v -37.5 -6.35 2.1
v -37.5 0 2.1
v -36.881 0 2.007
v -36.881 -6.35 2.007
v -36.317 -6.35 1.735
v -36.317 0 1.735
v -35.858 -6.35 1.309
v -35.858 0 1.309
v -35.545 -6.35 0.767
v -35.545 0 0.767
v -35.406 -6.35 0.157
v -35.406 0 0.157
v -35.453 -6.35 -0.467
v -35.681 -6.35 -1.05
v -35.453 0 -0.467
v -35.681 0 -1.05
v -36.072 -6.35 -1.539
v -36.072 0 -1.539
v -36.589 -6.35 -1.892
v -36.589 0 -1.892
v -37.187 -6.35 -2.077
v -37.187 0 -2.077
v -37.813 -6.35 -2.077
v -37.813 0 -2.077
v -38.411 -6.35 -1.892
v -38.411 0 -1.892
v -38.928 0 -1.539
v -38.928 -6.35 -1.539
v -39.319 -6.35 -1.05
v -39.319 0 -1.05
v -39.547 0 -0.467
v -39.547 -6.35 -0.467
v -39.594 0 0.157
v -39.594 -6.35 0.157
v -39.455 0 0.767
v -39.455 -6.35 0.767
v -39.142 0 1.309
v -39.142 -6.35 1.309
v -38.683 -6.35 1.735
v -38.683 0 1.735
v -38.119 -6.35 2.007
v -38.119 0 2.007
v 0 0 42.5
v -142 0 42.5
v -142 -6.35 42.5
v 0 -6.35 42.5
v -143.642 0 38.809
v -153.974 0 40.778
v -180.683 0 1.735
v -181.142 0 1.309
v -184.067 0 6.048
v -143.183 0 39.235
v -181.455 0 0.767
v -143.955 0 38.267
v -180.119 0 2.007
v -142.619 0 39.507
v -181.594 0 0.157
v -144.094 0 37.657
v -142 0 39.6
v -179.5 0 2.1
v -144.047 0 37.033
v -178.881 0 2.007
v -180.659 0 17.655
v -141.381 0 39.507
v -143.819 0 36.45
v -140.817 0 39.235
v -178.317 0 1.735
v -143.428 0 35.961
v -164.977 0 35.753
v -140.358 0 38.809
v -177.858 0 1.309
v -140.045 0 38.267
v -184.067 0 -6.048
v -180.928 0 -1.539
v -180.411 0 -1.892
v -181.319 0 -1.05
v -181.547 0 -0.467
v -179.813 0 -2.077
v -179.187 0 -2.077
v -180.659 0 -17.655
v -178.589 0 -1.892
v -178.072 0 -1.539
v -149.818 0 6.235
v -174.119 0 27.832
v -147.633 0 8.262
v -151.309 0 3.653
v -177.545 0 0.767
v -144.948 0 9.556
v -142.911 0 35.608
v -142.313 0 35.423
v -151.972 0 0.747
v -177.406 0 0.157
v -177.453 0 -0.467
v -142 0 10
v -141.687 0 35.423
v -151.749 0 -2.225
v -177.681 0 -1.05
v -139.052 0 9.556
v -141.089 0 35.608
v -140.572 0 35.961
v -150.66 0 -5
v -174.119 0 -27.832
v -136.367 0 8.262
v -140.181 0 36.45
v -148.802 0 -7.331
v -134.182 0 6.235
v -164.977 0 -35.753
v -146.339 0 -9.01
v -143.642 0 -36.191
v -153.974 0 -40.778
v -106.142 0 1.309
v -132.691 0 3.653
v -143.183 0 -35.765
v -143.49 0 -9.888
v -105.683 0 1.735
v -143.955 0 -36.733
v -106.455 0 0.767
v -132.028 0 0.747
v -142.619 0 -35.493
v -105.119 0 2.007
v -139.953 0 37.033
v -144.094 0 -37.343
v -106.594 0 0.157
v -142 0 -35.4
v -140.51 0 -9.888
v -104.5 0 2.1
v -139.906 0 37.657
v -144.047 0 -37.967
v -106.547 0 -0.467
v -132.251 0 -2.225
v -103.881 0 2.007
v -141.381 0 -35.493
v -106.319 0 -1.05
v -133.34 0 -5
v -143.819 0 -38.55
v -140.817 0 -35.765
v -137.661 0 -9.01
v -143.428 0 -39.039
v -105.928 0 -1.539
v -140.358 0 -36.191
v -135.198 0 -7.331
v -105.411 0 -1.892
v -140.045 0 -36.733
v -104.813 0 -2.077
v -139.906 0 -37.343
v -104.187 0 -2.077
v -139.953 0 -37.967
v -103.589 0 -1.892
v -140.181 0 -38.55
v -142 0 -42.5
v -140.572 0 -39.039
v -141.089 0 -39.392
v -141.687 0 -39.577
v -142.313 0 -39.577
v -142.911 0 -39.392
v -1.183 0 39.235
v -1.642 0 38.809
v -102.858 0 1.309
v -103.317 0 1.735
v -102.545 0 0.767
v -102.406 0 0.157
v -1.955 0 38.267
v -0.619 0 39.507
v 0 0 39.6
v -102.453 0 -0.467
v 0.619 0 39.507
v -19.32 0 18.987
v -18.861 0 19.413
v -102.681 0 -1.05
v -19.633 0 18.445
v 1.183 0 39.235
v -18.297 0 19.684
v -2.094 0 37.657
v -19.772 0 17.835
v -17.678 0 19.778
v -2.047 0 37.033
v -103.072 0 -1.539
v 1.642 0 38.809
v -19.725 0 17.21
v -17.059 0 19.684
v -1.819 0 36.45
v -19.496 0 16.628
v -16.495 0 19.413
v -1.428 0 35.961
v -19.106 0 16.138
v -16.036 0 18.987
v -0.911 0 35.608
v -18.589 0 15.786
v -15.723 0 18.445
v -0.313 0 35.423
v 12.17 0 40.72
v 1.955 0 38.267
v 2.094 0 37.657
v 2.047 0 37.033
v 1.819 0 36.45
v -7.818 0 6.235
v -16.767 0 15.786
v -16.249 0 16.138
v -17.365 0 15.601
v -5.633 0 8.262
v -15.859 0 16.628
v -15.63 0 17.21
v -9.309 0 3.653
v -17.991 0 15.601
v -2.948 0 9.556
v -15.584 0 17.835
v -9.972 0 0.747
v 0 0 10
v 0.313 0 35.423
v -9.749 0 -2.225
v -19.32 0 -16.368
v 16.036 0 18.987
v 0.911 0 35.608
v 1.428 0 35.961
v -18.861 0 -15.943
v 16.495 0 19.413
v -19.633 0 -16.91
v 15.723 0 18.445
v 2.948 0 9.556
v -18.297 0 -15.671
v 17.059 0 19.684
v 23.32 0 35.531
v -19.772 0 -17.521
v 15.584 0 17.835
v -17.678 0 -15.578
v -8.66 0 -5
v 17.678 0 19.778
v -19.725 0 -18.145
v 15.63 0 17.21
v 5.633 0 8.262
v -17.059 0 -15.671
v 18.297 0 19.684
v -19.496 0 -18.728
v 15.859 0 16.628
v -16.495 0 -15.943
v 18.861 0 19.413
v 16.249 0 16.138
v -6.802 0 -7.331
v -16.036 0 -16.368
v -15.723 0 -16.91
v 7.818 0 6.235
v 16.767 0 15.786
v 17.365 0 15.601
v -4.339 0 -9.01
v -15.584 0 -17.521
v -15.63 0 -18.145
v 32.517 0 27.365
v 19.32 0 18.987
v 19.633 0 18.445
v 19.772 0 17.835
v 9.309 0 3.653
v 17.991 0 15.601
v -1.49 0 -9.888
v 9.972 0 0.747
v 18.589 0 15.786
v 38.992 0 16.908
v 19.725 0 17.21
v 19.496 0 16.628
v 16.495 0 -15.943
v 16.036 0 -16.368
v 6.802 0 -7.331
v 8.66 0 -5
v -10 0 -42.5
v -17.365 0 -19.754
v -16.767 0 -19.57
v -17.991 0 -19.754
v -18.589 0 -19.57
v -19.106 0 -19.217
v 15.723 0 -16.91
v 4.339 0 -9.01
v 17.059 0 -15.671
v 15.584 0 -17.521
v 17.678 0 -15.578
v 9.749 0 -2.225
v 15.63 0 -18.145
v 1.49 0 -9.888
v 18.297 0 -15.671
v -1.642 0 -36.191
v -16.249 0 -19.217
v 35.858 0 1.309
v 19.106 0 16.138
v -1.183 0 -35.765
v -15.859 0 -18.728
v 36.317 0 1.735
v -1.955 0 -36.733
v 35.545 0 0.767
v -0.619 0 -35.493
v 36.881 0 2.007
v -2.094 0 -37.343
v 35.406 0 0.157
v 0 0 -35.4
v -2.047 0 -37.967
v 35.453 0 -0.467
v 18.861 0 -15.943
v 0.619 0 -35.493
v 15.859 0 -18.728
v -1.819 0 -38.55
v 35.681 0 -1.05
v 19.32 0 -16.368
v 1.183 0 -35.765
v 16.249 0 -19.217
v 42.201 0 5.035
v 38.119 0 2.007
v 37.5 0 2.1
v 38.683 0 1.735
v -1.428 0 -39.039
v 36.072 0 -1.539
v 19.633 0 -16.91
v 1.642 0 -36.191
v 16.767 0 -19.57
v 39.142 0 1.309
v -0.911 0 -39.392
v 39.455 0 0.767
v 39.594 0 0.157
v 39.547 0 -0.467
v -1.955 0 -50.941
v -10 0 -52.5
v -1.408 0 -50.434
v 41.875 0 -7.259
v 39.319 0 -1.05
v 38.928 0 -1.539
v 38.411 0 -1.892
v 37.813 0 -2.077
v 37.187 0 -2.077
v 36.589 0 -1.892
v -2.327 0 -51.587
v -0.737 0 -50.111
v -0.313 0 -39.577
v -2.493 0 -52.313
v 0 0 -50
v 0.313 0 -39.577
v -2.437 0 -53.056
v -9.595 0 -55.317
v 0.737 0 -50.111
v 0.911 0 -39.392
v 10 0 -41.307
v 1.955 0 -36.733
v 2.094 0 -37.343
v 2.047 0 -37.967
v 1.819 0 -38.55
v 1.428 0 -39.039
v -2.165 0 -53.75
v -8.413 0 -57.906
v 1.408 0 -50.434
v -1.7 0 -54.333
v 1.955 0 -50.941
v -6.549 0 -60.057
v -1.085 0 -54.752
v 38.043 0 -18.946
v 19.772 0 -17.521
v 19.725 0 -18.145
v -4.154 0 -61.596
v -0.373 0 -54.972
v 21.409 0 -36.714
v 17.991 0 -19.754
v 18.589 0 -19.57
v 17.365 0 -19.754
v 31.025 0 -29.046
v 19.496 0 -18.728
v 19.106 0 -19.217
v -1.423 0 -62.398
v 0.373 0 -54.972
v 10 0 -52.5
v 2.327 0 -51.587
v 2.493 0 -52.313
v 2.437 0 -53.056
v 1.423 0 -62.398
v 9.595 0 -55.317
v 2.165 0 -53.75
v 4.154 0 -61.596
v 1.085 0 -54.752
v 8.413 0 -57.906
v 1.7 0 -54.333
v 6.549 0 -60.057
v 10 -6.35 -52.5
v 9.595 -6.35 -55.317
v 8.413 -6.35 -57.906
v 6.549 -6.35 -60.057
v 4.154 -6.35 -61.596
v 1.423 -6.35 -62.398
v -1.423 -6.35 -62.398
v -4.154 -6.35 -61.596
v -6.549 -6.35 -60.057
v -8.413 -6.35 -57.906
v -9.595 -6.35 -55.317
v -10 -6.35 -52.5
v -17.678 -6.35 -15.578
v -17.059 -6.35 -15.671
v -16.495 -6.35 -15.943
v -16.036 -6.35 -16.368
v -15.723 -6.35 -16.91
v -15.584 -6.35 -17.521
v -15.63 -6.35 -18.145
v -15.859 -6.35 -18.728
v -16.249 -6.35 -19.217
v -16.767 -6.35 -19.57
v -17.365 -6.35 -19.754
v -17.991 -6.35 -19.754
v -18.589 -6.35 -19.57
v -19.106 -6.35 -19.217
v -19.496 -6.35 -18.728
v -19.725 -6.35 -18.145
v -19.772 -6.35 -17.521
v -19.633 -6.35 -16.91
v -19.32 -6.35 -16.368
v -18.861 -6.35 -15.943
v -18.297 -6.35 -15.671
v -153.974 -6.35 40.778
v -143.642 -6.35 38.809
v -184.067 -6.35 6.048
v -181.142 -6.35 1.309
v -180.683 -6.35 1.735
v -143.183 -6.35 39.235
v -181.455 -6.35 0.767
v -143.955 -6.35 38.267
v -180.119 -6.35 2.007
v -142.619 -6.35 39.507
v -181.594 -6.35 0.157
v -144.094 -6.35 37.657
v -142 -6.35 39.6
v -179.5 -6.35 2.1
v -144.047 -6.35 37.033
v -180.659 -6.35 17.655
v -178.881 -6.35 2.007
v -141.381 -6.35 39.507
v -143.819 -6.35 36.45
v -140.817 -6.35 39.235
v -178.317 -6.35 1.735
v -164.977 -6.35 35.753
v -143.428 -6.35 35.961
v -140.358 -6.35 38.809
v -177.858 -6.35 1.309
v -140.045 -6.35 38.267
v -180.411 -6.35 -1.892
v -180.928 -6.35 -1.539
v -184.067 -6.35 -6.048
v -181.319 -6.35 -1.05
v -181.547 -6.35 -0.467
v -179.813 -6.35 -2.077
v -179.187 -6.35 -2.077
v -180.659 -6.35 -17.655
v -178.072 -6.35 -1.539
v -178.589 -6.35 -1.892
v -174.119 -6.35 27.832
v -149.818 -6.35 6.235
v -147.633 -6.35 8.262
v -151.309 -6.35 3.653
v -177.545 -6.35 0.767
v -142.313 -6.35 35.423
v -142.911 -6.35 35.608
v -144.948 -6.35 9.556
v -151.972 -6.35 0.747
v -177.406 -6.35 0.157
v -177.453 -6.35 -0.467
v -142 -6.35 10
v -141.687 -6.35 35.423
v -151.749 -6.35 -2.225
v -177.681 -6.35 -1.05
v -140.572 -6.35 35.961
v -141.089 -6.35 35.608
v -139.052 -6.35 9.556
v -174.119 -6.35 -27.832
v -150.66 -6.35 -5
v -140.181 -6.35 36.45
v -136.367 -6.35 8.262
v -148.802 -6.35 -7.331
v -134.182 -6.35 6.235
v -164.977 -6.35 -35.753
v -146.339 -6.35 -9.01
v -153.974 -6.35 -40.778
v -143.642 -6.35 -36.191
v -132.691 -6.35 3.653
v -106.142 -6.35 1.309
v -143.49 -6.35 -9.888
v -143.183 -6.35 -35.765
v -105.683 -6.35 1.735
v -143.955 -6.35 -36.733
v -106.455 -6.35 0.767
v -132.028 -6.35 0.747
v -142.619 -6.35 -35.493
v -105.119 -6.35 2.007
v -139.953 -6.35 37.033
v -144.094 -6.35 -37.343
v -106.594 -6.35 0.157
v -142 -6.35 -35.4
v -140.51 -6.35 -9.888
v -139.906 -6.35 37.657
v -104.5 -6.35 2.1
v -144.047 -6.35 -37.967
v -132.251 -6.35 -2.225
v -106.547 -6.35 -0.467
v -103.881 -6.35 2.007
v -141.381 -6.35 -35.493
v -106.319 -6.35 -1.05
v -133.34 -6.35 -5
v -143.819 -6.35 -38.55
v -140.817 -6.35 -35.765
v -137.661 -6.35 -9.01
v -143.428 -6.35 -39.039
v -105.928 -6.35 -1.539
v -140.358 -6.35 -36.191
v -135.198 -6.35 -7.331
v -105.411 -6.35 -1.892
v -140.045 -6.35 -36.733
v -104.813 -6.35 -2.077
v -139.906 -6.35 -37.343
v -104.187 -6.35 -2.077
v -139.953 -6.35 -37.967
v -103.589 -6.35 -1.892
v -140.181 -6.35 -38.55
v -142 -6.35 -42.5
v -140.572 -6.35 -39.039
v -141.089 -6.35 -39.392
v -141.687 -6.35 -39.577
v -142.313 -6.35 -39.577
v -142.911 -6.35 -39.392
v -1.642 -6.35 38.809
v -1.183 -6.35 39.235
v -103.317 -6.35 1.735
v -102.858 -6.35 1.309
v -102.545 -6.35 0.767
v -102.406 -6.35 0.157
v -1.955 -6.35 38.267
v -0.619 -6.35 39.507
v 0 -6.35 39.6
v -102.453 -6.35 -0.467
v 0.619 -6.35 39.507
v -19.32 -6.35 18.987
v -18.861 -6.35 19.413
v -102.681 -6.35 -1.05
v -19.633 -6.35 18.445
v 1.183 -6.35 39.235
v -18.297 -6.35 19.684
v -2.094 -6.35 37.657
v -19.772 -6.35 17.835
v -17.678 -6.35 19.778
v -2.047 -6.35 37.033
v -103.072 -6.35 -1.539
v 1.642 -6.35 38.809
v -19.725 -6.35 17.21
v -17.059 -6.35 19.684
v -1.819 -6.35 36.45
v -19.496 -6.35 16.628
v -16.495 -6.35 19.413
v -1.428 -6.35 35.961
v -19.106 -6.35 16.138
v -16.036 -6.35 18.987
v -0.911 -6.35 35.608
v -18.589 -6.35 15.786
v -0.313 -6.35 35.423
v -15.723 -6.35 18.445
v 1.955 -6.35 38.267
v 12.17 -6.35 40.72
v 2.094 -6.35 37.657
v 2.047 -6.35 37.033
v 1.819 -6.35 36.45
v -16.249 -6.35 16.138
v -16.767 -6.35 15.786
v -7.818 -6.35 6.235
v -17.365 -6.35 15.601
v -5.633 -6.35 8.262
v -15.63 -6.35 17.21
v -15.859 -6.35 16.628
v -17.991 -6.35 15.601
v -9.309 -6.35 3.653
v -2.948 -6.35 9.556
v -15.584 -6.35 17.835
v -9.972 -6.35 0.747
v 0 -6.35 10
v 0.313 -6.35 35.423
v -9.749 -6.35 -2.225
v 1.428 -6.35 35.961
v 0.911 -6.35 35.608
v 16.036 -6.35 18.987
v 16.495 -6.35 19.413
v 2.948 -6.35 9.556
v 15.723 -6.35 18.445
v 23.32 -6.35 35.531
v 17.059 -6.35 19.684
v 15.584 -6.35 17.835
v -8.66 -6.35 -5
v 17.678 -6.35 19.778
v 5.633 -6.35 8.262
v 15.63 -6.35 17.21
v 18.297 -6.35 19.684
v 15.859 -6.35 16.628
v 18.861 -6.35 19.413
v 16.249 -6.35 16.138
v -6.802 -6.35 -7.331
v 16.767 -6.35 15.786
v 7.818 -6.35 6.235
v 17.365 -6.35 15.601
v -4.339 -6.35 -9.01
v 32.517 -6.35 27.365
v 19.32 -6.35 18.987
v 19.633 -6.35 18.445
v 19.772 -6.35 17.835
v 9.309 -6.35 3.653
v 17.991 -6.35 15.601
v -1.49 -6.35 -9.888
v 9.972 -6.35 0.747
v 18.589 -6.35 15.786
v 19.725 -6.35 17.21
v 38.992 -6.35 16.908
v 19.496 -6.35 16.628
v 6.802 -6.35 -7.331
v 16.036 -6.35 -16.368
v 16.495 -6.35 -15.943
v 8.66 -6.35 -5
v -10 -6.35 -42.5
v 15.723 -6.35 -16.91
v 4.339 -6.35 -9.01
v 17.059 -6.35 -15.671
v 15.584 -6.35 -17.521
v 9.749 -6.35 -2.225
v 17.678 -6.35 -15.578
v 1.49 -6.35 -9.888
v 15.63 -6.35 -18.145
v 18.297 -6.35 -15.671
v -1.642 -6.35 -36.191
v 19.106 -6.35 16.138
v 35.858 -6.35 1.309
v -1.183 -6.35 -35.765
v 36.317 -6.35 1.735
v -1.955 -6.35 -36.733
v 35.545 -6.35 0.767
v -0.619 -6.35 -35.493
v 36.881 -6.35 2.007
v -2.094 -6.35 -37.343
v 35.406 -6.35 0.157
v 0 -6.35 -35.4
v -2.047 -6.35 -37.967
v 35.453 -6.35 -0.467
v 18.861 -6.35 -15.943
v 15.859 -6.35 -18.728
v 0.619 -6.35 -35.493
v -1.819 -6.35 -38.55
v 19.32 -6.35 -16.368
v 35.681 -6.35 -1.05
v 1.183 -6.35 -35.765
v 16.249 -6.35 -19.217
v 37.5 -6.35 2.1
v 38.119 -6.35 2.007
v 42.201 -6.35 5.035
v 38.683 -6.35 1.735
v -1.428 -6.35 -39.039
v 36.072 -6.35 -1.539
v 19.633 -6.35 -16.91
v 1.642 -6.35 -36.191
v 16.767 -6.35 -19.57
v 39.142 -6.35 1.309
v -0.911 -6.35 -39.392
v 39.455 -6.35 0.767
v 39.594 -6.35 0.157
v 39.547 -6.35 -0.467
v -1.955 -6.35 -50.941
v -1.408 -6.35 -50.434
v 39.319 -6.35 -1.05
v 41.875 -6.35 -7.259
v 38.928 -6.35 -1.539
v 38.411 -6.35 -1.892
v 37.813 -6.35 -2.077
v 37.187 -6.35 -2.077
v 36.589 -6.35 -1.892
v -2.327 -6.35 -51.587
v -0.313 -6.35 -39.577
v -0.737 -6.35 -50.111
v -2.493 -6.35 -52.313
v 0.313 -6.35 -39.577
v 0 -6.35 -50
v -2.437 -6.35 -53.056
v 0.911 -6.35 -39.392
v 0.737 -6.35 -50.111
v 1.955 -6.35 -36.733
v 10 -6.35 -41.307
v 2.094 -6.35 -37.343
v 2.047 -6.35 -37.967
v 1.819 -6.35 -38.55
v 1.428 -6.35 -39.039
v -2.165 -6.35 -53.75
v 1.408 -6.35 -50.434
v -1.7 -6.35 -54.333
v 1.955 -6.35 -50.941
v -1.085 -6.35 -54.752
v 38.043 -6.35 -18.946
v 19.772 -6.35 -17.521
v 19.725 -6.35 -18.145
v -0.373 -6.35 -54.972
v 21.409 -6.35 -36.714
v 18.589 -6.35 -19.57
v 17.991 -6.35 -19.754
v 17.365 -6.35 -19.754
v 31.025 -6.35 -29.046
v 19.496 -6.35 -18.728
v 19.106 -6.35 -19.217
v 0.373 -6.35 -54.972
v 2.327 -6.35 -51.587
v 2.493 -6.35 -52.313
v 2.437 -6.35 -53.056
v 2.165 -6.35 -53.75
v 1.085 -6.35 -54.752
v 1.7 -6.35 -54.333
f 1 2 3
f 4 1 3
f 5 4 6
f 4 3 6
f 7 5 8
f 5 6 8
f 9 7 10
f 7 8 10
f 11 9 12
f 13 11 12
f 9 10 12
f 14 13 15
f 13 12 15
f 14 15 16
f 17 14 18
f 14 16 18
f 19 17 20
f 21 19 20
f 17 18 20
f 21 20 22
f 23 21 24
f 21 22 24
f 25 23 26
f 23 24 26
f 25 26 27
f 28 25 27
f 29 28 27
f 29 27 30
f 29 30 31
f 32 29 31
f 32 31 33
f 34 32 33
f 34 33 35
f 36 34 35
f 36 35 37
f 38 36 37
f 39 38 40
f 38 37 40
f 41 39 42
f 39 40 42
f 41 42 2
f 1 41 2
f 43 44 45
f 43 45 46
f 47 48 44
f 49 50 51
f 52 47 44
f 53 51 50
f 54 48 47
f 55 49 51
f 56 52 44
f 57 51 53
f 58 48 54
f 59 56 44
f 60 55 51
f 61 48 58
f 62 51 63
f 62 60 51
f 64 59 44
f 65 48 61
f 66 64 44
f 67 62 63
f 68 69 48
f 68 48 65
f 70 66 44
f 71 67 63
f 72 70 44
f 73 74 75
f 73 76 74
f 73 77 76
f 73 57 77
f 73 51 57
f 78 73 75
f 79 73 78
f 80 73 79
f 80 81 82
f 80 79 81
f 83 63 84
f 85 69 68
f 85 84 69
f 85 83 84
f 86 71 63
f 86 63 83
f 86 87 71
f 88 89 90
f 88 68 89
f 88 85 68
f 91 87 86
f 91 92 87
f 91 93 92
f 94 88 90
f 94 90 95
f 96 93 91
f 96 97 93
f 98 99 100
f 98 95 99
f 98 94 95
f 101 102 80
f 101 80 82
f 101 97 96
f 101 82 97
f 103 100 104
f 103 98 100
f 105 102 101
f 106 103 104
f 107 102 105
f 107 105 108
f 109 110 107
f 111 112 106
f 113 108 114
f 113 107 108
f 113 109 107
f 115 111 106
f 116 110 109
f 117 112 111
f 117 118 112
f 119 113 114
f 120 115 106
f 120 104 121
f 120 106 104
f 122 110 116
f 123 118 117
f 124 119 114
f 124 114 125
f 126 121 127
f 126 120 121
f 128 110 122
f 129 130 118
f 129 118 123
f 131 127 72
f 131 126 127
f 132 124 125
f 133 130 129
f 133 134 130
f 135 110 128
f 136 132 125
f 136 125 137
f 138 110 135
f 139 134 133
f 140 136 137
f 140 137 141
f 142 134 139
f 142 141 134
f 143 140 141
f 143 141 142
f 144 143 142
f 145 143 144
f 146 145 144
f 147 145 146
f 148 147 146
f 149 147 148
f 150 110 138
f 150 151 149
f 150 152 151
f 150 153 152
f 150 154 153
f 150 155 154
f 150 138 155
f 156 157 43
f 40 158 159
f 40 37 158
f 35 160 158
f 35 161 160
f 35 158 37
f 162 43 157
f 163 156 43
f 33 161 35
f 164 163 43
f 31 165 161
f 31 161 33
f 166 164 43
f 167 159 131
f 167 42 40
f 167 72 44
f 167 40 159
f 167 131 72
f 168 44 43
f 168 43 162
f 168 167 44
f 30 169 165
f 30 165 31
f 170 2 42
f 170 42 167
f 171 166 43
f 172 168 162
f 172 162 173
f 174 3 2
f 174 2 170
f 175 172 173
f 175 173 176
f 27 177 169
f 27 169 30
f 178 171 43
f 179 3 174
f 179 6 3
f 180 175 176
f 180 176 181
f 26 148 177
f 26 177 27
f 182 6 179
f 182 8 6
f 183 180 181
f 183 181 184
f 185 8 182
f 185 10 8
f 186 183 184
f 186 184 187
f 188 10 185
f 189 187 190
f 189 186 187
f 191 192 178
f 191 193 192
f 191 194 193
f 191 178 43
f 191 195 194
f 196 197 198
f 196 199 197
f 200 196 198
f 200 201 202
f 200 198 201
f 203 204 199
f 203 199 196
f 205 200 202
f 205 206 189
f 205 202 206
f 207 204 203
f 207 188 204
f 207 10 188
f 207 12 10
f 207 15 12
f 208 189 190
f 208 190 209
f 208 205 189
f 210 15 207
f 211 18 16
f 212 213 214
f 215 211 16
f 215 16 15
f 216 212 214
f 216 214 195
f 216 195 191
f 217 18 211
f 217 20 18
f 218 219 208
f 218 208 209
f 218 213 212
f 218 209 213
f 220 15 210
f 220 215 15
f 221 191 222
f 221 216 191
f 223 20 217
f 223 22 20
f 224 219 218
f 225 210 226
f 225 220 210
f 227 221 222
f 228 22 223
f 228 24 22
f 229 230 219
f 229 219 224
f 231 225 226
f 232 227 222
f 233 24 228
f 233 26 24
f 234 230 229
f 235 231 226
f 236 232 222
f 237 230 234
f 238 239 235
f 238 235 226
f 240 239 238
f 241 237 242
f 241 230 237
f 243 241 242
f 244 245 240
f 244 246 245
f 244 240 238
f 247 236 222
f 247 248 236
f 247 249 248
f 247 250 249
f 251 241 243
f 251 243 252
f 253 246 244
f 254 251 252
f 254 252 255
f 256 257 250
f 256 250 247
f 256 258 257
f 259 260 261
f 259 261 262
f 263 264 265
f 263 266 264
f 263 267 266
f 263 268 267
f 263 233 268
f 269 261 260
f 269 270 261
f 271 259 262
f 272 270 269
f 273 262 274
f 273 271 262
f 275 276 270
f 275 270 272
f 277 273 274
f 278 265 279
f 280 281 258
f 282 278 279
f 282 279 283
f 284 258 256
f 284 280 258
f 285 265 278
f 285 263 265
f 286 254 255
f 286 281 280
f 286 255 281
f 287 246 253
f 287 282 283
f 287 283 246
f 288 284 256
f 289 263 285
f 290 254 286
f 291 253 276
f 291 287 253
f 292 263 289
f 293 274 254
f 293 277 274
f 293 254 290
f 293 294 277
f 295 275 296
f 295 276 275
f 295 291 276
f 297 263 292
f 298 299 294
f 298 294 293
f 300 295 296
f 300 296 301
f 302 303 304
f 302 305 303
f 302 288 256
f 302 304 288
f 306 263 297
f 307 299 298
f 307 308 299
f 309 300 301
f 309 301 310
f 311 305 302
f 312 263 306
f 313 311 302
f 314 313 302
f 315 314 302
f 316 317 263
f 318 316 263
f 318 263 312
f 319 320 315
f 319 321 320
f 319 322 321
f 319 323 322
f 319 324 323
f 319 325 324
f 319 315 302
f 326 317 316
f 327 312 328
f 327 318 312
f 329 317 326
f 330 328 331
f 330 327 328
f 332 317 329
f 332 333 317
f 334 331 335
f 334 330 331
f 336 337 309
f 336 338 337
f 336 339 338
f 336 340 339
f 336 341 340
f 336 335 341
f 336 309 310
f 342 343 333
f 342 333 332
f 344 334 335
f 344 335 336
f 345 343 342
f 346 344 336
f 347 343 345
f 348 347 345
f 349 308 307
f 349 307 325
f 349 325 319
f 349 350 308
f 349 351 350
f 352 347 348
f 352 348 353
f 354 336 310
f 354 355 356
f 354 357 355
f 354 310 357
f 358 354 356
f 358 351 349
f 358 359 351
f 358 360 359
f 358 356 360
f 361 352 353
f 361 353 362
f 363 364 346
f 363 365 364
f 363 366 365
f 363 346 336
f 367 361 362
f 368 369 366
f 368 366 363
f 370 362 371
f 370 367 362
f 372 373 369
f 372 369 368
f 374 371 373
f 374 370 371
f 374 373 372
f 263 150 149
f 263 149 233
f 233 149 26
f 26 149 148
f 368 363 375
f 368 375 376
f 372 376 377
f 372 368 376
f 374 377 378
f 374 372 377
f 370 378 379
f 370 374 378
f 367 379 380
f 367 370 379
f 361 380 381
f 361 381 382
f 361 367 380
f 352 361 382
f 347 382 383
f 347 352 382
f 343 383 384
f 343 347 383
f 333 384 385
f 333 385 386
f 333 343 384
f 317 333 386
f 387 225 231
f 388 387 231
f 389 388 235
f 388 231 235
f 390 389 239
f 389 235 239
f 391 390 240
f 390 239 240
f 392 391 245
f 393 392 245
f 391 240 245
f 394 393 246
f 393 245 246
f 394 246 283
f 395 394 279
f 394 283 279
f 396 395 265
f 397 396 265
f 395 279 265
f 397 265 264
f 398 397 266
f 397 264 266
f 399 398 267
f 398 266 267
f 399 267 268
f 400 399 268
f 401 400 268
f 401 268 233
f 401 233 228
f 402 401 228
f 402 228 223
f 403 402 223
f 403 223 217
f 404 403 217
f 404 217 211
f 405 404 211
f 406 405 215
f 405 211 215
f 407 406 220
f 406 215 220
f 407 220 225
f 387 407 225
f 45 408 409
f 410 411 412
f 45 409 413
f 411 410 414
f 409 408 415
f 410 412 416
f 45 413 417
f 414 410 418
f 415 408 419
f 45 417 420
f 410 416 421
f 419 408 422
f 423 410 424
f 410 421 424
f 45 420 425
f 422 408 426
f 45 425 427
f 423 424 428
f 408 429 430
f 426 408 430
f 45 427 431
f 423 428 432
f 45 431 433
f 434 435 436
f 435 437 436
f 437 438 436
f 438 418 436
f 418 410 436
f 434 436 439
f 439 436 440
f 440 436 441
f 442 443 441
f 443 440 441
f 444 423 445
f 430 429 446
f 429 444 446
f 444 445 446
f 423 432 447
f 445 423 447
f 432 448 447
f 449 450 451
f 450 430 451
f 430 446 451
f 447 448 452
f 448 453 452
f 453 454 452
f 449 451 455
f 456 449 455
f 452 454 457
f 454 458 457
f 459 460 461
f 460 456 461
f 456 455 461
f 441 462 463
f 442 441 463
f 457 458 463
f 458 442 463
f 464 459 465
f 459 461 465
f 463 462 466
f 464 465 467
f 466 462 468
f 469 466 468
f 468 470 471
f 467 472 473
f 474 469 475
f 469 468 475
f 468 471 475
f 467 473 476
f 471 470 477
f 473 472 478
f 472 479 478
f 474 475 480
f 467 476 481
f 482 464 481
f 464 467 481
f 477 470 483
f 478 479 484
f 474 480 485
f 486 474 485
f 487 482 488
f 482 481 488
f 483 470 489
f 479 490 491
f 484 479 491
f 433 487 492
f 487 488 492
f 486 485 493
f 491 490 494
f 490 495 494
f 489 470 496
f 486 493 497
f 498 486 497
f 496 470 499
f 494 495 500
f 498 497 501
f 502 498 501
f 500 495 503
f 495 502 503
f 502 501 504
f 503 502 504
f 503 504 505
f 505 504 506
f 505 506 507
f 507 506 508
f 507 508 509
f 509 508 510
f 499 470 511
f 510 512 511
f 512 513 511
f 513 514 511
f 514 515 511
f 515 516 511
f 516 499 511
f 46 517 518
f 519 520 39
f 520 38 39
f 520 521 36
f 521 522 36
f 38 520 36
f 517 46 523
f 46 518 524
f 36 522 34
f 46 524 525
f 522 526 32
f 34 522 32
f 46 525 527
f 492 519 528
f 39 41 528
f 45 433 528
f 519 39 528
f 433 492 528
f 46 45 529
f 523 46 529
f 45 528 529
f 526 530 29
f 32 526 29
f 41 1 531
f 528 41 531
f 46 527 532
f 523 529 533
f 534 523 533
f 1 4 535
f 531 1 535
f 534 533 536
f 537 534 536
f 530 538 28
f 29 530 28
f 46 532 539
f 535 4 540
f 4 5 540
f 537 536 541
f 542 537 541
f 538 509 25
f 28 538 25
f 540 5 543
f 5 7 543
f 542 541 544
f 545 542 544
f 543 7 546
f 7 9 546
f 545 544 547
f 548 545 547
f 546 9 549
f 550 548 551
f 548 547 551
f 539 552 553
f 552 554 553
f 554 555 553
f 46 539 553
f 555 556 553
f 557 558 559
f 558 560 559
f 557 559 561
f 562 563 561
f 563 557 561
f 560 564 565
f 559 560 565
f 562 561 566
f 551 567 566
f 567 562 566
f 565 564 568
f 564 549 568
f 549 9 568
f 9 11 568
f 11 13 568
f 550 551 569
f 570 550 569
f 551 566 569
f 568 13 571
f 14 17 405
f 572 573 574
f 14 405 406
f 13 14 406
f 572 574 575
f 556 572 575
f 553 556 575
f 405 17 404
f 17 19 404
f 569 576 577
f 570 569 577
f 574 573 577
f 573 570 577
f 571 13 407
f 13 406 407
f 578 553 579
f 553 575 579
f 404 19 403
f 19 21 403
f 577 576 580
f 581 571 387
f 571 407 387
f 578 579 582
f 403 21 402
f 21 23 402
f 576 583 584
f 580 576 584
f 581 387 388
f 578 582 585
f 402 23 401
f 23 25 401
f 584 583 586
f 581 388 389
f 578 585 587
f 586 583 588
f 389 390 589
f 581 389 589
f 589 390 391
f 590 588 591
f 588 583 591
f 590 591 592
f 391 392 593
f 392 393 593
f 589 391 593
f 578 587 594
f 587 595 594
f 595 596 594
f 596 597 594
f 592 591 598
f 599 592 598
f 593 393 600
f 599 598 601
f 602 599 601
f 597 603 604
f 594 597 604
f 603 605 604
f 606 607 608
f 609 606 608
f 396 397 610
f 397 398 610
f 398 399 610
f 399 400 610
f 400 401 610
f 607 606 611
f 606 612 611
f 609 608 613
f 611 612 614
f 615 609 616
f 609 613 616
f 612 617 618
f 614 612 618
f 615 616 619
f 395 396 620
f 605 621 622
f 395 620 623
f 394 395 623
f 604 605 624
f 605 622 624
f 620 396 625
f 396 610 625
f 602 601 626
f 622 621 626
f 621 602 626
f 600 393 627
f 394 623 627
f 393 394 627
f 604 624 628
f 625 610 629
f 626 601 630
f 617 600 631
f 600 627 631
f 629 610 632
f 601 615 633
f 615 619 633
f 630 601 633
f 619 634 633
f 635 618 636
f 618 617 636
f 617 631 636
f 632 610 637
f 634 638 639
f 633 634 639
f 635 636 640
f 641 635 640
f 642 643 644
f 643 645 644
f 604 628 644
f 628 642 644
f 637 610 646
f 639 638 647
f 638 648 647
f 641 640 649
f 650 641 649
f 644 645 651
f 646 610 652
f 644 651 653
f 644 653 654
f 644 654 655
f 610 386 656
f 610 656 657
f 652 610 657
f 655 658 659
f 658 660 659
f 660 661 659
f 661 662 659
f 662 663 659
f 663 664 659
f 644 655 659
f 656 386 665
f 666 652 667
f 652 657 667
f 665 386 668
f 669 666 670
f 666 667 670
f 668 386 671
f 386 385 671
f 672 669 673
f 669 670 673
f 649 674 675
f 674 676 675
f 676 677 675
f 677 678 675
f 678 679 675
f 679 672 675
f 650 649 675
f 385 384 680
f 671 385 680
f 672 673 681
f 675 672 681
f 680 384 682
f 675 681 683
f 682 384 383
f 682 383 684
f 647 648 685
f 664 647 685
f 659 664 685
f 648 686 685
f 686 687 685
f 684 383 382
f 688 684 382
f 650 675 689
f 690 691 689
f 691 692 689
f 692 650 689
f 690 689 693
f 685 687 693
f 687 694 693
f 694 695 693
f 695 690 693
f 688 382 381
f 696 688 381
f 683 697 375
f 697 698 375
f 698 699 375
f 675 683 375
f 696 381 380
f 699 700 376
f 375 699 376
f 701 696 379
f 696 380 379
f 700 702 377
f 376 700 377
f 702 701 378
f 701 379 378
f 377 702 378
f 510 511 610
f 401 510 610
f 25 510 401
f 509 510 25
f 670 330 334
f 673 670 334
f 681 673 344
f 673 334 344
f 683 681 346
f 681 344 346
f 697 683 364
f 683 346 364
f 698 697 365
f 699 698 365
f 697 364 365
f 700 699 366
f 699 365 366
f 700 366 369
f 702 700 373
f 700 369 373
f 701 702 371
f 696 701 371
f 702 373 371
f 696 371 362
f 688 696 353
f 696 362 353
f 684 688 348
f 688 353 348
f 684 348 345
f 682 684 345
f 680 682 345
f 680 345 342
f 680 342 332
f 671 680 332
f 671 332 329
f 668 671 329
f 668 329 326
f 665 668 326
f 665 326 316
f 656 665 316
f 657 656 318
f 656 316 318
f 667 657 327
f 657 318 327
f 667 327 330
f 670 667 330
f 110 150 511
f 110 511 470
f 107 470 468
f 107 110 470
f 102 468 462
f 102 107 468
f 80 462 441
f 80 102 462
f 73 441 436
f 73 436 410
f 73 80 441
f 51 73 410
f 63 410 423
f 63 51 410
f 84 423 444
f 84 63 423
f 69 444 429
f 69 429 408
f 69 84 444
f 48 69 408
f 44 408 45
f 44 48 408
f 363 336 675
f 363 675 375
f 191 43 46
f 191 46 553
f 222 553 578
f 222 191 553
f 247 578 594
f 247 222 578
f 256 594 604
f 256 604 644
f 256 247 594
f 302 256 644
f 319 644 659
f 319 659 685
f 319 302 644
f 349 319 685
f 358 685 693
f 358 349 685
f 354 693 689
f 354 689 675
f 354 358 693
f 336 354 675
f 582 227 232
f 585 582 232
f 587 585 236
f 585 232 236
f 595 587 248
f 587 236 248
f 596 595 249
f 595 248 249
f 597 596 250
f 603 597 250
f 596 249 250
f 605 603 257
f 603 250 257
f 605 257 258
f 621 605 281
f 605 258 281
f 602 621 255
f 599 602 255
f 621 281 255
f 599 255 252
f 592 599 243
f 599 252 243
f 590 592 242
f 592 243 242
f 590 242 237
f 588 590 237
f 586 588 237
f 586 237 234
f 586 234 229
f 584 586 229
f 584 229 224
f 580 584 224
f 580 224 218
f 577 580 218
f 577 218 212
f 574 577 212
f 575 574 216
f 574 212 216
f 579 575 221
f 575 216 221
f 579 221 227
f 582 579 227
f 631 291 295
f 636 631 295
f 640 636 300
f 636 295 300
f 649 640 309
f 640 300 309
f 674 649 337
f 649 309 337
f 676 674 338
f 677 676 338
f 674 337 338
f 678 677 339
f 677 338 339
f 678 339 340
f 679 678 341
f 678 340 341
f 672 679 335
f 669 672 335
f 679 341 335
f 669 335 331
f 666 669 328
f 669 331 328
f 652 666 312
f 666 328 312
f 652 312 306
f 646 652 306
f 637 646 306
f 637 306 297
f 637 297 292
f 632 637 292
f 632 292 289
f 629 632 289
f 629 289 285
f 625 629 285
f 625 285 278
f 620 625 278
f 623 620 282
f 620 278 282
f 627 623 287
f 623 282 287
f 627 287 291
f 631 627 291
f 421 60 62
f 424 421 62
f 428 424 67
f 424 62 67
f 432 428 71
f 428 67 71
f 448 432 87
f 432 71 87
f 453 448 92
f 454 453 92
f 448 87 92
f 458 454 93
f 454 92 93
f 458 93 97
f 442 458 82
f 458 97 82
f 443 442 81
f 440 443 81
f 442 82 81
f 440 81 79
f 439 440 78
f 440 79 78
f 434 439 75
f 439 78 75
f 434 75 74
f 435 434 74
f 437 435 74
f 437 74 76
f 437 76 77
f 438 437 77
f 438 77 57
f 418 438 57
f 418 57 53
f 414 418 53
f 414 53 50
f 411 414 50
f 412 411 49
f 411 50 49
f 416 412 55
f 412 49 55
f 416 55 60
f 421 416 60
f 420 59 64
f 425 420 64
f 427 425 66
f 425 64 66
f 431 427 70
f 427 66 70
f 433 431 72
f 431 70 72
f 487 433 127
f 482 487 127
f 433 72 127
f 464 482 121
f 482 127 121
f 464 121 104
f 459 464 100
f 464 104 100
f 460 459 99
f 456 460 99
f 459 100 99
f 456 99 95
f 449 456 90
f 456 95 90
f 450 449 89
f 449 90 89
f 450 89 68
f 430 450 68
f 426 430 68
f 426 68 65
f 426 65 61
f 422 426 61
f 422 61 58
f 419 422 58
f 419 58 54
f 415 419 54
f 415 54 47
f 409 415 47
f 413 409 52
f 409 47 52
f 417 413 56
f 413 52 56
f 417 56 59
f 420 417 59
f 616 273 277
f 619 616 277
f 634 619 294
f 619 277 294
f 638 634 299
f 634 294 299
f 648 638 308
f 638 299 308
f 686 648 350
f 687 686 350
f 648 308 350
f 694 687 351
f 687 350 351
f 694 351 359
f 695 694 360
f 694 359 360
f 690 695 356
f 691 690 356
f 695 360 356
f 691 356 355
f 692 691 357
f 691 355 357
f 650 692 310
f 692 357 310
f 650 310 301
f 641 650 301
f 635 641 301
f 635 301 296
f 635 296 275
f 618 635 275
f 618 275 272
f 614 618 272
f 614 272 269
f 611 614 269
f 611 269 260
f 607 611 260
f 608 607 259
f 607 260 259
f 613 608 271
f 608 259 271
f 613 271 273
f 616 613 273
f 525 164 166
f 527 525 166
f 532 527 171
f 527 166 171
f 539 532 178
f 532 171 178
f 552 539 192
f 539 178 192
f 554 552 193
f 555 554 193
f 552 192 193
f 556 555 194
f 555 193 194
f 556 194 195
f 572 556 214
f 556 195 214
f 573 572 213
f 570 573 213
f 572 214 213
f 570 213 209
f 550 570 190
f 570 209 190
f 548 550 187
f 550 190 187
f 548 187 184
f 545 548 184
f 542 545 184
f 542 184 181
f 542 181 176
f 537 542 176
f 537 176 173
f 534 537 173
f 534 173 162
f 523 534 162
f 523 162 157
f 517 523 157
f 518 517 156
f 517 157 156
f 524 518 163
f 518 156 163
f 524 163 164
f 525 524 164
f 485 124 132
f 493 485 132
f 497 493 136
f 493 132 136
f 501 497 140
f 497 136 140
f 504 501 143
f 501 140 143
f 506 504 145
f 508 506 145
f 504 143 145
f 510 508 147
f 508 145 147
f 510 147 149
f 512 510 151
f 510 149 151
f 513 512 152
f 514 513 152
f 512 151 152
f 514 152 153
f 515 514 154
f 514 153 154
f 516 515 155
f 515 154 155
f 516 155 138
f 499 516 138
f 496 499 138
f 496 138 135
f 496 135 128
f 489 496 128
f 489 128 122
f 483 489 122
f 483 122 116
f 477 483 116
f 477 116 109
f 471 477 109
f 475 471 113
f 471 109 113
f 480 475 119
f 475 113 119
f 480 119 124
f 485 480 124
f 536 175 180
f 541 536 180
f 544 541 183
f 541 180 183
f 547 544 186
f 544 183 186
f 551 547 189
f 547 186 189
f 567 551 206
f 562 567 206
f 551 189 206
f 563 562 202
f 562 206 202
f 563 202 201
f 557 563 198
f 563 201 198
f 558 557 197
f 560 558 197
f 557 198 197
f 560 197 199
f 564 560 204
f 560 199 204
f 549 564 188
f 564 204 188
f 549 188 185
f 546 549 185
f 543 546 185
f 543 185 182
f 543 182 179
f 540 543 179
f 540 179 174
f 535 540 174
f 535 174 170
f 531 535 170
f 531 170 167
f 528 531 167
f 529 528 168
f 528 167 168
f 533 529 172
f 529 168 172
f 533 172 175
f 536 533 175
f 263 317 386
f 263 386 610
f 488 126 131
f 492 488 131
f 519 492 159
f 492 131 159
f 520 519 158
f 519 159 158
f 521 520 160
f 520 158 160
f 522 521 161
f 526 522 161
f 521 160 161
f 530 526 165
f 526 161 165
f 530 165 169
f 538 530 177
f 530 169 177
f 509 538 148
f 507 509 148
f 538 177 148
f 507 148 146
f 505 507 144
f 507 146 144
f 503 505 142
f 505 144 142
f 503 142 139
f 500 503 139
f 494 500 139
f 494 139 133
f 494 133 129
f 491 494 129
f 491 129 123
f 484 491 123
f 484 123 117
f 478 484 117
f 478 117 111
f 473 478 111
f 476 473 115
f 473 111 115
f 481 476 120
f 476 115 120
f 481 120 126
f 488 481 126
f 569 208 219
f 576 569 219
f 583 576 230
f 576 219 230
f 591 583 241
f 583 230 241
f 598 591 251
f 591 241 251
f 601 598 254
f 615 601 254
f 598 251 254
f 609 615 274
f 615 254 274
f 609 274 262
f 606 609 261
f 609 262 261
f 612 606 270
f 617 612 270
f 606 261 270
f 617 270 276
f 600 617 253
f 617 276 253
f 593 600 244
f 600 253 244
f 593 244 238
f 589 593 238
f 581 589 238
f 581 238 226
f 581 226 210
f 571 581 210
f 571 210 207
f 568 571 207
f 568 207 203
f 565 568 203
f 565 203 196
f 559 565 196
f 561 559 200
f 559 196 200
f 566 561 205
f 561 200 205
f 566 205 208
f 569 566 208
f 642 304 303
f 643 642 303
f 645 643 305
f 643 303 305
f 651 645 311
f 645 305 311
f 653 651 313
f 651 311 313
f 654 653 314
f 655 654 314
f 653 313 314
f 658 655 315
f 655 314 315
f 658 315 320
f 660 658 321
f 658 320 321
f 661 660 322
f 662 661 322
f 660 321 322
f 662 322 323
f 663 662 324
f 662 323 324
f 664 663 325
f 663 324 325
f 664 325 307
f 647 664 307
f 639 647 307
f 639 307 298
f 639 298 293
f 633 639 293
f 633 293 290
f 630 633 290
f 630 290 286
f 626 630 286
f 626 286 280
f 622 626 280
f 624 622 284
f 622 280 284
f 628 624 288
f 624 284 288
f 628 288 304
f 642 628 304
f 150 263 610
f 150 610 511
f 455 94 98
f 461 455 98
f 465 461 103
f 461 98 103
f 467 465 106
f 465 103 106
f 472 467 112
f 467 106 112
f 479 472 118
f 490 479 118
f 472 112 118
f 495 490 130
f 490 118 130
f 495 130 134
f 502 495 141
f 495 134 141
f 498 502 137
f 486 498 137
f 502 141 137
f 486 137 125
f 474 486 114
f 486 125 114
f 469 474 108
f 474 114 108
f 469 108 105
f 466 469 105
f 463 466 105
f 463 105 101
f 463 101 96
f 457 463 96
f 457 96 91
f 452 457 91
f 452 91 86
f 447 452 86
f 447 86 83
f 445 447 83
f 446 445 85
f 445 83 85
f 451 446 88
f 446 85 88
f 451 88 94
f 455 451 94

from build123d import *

# Parameters (mm, degrees)
SKETCH1_R           = 2.1
SKETCH1_R_2         = 10
SKETCH1_R_3         = 2.5
BOSS_EXTRUDE1_DEPTH = 6.35


with BuildPart() as part:
    # Sketch1 → Boss-Extrude1 (new body)
    with BuildSketch(Plane(origin=(0, 0, 0), x_dir=(1, 0, 0), z_dir=(0, 1, 0))):
        with BuildLine():
            Line((-10, 42.5), (-142, 42.5))
            ThreePointArc((-142, 42.5), (-184.5, 0), (-142, -42.5))
            Line((-142, -42.5), (0, -42.5))
            ThreePointArc((0, -42.5), (42.200640469, -5.0354686), (10, 41.306779105))
            Line((10, 41.306779105), (10, 52.5))
            ThreePointArc((10, 52.5), (0, 62.5), (-10, 52.5))
            Line((-10, 52.5), (-10, 42.5))
        make_face()
        with Locations(Location((-104.5, 0, 0), (0, 0, 270))):
            Circle(SKETCH1_R, mode=Mode.SUBTRACT)
        with Locations(Location((-142, 37.5, 0), (0, 0, 270))):
            Circle(SKETCH1_R, mode=Mode.SUBTRACT)
        with Locations(Location((-142, -37.5, 0), (0, 0, 270))):
            Circle(SKETCH1_R, mode=Mode.SUBTRACT)
        with Locations(Location((-179.5, 0, 0), (0, 0, 270))):
            Circle(SKETCH1_R, mode=Mode.SUBTRACT)
        with Locations(Location((-142, 0, 0), (0, 0, 270))):
            Circle(SKETCH1_R_2, mode=Mode.SUBTRACT)
        with Locations(Location((0, 37.5, 0), (0, 0, 270))):
            Circle(SKETCH1_R, mode=Mode.SUBTRACT)
        with Locations(Location((17.67766953, 17.67766953, 0), (0, 0, 270))):
            Circle(SKETCH1_R, mode=Mode.SUBTRACT)
        with Locations(Location((-17.67766953, -17.67766953, 0), (0, 0, 270))):
            Circle(SKETCH1_R, mode=Mode.SUBTRACT)
        with Locations(Location((0, -37.5, 0), (0, 0, 270))):
            Circle(SKETCH1_R, mode=Mode.SUBTRACT)
        with Locations(Location((17.67766953, -17.67766953, 0), (0, 0, 270))):
            Circle(SKETCH1_R, mode=Mode.SUBTRACT)
        with Locations(Location((-37.5, 0, 0), (0, 0, 270))):
            Circle(SKETCH1_R, mode=Mode.SUBTRACT)
        with Locations(Location((0, 0, 0), (0, 0, 270))):
            Circle(SKETCH1_R_2, mode=Mode.SUBTRACT)
        with Locations(Location((37.5, 0, 0), (0, 0, 270))):
            Circle(SKETCH1_R, mode=Mode.SUBTRACT)
        with Locations(Location((-17.67766953, 17.67766953, 0), (0, 0, 270))):
            Circle(SKETCH1_R, mode=Mode.SUBTRACT)
        with Locations(Location((0, 52.5, 0), (0, 0, 270))):
            Circle(SKETCH1_R_3, mode=Mode.SUBTRACT)
    extrude(amount=-BOSS_EXTRUDE1_DEPTH)


solid = part.part
